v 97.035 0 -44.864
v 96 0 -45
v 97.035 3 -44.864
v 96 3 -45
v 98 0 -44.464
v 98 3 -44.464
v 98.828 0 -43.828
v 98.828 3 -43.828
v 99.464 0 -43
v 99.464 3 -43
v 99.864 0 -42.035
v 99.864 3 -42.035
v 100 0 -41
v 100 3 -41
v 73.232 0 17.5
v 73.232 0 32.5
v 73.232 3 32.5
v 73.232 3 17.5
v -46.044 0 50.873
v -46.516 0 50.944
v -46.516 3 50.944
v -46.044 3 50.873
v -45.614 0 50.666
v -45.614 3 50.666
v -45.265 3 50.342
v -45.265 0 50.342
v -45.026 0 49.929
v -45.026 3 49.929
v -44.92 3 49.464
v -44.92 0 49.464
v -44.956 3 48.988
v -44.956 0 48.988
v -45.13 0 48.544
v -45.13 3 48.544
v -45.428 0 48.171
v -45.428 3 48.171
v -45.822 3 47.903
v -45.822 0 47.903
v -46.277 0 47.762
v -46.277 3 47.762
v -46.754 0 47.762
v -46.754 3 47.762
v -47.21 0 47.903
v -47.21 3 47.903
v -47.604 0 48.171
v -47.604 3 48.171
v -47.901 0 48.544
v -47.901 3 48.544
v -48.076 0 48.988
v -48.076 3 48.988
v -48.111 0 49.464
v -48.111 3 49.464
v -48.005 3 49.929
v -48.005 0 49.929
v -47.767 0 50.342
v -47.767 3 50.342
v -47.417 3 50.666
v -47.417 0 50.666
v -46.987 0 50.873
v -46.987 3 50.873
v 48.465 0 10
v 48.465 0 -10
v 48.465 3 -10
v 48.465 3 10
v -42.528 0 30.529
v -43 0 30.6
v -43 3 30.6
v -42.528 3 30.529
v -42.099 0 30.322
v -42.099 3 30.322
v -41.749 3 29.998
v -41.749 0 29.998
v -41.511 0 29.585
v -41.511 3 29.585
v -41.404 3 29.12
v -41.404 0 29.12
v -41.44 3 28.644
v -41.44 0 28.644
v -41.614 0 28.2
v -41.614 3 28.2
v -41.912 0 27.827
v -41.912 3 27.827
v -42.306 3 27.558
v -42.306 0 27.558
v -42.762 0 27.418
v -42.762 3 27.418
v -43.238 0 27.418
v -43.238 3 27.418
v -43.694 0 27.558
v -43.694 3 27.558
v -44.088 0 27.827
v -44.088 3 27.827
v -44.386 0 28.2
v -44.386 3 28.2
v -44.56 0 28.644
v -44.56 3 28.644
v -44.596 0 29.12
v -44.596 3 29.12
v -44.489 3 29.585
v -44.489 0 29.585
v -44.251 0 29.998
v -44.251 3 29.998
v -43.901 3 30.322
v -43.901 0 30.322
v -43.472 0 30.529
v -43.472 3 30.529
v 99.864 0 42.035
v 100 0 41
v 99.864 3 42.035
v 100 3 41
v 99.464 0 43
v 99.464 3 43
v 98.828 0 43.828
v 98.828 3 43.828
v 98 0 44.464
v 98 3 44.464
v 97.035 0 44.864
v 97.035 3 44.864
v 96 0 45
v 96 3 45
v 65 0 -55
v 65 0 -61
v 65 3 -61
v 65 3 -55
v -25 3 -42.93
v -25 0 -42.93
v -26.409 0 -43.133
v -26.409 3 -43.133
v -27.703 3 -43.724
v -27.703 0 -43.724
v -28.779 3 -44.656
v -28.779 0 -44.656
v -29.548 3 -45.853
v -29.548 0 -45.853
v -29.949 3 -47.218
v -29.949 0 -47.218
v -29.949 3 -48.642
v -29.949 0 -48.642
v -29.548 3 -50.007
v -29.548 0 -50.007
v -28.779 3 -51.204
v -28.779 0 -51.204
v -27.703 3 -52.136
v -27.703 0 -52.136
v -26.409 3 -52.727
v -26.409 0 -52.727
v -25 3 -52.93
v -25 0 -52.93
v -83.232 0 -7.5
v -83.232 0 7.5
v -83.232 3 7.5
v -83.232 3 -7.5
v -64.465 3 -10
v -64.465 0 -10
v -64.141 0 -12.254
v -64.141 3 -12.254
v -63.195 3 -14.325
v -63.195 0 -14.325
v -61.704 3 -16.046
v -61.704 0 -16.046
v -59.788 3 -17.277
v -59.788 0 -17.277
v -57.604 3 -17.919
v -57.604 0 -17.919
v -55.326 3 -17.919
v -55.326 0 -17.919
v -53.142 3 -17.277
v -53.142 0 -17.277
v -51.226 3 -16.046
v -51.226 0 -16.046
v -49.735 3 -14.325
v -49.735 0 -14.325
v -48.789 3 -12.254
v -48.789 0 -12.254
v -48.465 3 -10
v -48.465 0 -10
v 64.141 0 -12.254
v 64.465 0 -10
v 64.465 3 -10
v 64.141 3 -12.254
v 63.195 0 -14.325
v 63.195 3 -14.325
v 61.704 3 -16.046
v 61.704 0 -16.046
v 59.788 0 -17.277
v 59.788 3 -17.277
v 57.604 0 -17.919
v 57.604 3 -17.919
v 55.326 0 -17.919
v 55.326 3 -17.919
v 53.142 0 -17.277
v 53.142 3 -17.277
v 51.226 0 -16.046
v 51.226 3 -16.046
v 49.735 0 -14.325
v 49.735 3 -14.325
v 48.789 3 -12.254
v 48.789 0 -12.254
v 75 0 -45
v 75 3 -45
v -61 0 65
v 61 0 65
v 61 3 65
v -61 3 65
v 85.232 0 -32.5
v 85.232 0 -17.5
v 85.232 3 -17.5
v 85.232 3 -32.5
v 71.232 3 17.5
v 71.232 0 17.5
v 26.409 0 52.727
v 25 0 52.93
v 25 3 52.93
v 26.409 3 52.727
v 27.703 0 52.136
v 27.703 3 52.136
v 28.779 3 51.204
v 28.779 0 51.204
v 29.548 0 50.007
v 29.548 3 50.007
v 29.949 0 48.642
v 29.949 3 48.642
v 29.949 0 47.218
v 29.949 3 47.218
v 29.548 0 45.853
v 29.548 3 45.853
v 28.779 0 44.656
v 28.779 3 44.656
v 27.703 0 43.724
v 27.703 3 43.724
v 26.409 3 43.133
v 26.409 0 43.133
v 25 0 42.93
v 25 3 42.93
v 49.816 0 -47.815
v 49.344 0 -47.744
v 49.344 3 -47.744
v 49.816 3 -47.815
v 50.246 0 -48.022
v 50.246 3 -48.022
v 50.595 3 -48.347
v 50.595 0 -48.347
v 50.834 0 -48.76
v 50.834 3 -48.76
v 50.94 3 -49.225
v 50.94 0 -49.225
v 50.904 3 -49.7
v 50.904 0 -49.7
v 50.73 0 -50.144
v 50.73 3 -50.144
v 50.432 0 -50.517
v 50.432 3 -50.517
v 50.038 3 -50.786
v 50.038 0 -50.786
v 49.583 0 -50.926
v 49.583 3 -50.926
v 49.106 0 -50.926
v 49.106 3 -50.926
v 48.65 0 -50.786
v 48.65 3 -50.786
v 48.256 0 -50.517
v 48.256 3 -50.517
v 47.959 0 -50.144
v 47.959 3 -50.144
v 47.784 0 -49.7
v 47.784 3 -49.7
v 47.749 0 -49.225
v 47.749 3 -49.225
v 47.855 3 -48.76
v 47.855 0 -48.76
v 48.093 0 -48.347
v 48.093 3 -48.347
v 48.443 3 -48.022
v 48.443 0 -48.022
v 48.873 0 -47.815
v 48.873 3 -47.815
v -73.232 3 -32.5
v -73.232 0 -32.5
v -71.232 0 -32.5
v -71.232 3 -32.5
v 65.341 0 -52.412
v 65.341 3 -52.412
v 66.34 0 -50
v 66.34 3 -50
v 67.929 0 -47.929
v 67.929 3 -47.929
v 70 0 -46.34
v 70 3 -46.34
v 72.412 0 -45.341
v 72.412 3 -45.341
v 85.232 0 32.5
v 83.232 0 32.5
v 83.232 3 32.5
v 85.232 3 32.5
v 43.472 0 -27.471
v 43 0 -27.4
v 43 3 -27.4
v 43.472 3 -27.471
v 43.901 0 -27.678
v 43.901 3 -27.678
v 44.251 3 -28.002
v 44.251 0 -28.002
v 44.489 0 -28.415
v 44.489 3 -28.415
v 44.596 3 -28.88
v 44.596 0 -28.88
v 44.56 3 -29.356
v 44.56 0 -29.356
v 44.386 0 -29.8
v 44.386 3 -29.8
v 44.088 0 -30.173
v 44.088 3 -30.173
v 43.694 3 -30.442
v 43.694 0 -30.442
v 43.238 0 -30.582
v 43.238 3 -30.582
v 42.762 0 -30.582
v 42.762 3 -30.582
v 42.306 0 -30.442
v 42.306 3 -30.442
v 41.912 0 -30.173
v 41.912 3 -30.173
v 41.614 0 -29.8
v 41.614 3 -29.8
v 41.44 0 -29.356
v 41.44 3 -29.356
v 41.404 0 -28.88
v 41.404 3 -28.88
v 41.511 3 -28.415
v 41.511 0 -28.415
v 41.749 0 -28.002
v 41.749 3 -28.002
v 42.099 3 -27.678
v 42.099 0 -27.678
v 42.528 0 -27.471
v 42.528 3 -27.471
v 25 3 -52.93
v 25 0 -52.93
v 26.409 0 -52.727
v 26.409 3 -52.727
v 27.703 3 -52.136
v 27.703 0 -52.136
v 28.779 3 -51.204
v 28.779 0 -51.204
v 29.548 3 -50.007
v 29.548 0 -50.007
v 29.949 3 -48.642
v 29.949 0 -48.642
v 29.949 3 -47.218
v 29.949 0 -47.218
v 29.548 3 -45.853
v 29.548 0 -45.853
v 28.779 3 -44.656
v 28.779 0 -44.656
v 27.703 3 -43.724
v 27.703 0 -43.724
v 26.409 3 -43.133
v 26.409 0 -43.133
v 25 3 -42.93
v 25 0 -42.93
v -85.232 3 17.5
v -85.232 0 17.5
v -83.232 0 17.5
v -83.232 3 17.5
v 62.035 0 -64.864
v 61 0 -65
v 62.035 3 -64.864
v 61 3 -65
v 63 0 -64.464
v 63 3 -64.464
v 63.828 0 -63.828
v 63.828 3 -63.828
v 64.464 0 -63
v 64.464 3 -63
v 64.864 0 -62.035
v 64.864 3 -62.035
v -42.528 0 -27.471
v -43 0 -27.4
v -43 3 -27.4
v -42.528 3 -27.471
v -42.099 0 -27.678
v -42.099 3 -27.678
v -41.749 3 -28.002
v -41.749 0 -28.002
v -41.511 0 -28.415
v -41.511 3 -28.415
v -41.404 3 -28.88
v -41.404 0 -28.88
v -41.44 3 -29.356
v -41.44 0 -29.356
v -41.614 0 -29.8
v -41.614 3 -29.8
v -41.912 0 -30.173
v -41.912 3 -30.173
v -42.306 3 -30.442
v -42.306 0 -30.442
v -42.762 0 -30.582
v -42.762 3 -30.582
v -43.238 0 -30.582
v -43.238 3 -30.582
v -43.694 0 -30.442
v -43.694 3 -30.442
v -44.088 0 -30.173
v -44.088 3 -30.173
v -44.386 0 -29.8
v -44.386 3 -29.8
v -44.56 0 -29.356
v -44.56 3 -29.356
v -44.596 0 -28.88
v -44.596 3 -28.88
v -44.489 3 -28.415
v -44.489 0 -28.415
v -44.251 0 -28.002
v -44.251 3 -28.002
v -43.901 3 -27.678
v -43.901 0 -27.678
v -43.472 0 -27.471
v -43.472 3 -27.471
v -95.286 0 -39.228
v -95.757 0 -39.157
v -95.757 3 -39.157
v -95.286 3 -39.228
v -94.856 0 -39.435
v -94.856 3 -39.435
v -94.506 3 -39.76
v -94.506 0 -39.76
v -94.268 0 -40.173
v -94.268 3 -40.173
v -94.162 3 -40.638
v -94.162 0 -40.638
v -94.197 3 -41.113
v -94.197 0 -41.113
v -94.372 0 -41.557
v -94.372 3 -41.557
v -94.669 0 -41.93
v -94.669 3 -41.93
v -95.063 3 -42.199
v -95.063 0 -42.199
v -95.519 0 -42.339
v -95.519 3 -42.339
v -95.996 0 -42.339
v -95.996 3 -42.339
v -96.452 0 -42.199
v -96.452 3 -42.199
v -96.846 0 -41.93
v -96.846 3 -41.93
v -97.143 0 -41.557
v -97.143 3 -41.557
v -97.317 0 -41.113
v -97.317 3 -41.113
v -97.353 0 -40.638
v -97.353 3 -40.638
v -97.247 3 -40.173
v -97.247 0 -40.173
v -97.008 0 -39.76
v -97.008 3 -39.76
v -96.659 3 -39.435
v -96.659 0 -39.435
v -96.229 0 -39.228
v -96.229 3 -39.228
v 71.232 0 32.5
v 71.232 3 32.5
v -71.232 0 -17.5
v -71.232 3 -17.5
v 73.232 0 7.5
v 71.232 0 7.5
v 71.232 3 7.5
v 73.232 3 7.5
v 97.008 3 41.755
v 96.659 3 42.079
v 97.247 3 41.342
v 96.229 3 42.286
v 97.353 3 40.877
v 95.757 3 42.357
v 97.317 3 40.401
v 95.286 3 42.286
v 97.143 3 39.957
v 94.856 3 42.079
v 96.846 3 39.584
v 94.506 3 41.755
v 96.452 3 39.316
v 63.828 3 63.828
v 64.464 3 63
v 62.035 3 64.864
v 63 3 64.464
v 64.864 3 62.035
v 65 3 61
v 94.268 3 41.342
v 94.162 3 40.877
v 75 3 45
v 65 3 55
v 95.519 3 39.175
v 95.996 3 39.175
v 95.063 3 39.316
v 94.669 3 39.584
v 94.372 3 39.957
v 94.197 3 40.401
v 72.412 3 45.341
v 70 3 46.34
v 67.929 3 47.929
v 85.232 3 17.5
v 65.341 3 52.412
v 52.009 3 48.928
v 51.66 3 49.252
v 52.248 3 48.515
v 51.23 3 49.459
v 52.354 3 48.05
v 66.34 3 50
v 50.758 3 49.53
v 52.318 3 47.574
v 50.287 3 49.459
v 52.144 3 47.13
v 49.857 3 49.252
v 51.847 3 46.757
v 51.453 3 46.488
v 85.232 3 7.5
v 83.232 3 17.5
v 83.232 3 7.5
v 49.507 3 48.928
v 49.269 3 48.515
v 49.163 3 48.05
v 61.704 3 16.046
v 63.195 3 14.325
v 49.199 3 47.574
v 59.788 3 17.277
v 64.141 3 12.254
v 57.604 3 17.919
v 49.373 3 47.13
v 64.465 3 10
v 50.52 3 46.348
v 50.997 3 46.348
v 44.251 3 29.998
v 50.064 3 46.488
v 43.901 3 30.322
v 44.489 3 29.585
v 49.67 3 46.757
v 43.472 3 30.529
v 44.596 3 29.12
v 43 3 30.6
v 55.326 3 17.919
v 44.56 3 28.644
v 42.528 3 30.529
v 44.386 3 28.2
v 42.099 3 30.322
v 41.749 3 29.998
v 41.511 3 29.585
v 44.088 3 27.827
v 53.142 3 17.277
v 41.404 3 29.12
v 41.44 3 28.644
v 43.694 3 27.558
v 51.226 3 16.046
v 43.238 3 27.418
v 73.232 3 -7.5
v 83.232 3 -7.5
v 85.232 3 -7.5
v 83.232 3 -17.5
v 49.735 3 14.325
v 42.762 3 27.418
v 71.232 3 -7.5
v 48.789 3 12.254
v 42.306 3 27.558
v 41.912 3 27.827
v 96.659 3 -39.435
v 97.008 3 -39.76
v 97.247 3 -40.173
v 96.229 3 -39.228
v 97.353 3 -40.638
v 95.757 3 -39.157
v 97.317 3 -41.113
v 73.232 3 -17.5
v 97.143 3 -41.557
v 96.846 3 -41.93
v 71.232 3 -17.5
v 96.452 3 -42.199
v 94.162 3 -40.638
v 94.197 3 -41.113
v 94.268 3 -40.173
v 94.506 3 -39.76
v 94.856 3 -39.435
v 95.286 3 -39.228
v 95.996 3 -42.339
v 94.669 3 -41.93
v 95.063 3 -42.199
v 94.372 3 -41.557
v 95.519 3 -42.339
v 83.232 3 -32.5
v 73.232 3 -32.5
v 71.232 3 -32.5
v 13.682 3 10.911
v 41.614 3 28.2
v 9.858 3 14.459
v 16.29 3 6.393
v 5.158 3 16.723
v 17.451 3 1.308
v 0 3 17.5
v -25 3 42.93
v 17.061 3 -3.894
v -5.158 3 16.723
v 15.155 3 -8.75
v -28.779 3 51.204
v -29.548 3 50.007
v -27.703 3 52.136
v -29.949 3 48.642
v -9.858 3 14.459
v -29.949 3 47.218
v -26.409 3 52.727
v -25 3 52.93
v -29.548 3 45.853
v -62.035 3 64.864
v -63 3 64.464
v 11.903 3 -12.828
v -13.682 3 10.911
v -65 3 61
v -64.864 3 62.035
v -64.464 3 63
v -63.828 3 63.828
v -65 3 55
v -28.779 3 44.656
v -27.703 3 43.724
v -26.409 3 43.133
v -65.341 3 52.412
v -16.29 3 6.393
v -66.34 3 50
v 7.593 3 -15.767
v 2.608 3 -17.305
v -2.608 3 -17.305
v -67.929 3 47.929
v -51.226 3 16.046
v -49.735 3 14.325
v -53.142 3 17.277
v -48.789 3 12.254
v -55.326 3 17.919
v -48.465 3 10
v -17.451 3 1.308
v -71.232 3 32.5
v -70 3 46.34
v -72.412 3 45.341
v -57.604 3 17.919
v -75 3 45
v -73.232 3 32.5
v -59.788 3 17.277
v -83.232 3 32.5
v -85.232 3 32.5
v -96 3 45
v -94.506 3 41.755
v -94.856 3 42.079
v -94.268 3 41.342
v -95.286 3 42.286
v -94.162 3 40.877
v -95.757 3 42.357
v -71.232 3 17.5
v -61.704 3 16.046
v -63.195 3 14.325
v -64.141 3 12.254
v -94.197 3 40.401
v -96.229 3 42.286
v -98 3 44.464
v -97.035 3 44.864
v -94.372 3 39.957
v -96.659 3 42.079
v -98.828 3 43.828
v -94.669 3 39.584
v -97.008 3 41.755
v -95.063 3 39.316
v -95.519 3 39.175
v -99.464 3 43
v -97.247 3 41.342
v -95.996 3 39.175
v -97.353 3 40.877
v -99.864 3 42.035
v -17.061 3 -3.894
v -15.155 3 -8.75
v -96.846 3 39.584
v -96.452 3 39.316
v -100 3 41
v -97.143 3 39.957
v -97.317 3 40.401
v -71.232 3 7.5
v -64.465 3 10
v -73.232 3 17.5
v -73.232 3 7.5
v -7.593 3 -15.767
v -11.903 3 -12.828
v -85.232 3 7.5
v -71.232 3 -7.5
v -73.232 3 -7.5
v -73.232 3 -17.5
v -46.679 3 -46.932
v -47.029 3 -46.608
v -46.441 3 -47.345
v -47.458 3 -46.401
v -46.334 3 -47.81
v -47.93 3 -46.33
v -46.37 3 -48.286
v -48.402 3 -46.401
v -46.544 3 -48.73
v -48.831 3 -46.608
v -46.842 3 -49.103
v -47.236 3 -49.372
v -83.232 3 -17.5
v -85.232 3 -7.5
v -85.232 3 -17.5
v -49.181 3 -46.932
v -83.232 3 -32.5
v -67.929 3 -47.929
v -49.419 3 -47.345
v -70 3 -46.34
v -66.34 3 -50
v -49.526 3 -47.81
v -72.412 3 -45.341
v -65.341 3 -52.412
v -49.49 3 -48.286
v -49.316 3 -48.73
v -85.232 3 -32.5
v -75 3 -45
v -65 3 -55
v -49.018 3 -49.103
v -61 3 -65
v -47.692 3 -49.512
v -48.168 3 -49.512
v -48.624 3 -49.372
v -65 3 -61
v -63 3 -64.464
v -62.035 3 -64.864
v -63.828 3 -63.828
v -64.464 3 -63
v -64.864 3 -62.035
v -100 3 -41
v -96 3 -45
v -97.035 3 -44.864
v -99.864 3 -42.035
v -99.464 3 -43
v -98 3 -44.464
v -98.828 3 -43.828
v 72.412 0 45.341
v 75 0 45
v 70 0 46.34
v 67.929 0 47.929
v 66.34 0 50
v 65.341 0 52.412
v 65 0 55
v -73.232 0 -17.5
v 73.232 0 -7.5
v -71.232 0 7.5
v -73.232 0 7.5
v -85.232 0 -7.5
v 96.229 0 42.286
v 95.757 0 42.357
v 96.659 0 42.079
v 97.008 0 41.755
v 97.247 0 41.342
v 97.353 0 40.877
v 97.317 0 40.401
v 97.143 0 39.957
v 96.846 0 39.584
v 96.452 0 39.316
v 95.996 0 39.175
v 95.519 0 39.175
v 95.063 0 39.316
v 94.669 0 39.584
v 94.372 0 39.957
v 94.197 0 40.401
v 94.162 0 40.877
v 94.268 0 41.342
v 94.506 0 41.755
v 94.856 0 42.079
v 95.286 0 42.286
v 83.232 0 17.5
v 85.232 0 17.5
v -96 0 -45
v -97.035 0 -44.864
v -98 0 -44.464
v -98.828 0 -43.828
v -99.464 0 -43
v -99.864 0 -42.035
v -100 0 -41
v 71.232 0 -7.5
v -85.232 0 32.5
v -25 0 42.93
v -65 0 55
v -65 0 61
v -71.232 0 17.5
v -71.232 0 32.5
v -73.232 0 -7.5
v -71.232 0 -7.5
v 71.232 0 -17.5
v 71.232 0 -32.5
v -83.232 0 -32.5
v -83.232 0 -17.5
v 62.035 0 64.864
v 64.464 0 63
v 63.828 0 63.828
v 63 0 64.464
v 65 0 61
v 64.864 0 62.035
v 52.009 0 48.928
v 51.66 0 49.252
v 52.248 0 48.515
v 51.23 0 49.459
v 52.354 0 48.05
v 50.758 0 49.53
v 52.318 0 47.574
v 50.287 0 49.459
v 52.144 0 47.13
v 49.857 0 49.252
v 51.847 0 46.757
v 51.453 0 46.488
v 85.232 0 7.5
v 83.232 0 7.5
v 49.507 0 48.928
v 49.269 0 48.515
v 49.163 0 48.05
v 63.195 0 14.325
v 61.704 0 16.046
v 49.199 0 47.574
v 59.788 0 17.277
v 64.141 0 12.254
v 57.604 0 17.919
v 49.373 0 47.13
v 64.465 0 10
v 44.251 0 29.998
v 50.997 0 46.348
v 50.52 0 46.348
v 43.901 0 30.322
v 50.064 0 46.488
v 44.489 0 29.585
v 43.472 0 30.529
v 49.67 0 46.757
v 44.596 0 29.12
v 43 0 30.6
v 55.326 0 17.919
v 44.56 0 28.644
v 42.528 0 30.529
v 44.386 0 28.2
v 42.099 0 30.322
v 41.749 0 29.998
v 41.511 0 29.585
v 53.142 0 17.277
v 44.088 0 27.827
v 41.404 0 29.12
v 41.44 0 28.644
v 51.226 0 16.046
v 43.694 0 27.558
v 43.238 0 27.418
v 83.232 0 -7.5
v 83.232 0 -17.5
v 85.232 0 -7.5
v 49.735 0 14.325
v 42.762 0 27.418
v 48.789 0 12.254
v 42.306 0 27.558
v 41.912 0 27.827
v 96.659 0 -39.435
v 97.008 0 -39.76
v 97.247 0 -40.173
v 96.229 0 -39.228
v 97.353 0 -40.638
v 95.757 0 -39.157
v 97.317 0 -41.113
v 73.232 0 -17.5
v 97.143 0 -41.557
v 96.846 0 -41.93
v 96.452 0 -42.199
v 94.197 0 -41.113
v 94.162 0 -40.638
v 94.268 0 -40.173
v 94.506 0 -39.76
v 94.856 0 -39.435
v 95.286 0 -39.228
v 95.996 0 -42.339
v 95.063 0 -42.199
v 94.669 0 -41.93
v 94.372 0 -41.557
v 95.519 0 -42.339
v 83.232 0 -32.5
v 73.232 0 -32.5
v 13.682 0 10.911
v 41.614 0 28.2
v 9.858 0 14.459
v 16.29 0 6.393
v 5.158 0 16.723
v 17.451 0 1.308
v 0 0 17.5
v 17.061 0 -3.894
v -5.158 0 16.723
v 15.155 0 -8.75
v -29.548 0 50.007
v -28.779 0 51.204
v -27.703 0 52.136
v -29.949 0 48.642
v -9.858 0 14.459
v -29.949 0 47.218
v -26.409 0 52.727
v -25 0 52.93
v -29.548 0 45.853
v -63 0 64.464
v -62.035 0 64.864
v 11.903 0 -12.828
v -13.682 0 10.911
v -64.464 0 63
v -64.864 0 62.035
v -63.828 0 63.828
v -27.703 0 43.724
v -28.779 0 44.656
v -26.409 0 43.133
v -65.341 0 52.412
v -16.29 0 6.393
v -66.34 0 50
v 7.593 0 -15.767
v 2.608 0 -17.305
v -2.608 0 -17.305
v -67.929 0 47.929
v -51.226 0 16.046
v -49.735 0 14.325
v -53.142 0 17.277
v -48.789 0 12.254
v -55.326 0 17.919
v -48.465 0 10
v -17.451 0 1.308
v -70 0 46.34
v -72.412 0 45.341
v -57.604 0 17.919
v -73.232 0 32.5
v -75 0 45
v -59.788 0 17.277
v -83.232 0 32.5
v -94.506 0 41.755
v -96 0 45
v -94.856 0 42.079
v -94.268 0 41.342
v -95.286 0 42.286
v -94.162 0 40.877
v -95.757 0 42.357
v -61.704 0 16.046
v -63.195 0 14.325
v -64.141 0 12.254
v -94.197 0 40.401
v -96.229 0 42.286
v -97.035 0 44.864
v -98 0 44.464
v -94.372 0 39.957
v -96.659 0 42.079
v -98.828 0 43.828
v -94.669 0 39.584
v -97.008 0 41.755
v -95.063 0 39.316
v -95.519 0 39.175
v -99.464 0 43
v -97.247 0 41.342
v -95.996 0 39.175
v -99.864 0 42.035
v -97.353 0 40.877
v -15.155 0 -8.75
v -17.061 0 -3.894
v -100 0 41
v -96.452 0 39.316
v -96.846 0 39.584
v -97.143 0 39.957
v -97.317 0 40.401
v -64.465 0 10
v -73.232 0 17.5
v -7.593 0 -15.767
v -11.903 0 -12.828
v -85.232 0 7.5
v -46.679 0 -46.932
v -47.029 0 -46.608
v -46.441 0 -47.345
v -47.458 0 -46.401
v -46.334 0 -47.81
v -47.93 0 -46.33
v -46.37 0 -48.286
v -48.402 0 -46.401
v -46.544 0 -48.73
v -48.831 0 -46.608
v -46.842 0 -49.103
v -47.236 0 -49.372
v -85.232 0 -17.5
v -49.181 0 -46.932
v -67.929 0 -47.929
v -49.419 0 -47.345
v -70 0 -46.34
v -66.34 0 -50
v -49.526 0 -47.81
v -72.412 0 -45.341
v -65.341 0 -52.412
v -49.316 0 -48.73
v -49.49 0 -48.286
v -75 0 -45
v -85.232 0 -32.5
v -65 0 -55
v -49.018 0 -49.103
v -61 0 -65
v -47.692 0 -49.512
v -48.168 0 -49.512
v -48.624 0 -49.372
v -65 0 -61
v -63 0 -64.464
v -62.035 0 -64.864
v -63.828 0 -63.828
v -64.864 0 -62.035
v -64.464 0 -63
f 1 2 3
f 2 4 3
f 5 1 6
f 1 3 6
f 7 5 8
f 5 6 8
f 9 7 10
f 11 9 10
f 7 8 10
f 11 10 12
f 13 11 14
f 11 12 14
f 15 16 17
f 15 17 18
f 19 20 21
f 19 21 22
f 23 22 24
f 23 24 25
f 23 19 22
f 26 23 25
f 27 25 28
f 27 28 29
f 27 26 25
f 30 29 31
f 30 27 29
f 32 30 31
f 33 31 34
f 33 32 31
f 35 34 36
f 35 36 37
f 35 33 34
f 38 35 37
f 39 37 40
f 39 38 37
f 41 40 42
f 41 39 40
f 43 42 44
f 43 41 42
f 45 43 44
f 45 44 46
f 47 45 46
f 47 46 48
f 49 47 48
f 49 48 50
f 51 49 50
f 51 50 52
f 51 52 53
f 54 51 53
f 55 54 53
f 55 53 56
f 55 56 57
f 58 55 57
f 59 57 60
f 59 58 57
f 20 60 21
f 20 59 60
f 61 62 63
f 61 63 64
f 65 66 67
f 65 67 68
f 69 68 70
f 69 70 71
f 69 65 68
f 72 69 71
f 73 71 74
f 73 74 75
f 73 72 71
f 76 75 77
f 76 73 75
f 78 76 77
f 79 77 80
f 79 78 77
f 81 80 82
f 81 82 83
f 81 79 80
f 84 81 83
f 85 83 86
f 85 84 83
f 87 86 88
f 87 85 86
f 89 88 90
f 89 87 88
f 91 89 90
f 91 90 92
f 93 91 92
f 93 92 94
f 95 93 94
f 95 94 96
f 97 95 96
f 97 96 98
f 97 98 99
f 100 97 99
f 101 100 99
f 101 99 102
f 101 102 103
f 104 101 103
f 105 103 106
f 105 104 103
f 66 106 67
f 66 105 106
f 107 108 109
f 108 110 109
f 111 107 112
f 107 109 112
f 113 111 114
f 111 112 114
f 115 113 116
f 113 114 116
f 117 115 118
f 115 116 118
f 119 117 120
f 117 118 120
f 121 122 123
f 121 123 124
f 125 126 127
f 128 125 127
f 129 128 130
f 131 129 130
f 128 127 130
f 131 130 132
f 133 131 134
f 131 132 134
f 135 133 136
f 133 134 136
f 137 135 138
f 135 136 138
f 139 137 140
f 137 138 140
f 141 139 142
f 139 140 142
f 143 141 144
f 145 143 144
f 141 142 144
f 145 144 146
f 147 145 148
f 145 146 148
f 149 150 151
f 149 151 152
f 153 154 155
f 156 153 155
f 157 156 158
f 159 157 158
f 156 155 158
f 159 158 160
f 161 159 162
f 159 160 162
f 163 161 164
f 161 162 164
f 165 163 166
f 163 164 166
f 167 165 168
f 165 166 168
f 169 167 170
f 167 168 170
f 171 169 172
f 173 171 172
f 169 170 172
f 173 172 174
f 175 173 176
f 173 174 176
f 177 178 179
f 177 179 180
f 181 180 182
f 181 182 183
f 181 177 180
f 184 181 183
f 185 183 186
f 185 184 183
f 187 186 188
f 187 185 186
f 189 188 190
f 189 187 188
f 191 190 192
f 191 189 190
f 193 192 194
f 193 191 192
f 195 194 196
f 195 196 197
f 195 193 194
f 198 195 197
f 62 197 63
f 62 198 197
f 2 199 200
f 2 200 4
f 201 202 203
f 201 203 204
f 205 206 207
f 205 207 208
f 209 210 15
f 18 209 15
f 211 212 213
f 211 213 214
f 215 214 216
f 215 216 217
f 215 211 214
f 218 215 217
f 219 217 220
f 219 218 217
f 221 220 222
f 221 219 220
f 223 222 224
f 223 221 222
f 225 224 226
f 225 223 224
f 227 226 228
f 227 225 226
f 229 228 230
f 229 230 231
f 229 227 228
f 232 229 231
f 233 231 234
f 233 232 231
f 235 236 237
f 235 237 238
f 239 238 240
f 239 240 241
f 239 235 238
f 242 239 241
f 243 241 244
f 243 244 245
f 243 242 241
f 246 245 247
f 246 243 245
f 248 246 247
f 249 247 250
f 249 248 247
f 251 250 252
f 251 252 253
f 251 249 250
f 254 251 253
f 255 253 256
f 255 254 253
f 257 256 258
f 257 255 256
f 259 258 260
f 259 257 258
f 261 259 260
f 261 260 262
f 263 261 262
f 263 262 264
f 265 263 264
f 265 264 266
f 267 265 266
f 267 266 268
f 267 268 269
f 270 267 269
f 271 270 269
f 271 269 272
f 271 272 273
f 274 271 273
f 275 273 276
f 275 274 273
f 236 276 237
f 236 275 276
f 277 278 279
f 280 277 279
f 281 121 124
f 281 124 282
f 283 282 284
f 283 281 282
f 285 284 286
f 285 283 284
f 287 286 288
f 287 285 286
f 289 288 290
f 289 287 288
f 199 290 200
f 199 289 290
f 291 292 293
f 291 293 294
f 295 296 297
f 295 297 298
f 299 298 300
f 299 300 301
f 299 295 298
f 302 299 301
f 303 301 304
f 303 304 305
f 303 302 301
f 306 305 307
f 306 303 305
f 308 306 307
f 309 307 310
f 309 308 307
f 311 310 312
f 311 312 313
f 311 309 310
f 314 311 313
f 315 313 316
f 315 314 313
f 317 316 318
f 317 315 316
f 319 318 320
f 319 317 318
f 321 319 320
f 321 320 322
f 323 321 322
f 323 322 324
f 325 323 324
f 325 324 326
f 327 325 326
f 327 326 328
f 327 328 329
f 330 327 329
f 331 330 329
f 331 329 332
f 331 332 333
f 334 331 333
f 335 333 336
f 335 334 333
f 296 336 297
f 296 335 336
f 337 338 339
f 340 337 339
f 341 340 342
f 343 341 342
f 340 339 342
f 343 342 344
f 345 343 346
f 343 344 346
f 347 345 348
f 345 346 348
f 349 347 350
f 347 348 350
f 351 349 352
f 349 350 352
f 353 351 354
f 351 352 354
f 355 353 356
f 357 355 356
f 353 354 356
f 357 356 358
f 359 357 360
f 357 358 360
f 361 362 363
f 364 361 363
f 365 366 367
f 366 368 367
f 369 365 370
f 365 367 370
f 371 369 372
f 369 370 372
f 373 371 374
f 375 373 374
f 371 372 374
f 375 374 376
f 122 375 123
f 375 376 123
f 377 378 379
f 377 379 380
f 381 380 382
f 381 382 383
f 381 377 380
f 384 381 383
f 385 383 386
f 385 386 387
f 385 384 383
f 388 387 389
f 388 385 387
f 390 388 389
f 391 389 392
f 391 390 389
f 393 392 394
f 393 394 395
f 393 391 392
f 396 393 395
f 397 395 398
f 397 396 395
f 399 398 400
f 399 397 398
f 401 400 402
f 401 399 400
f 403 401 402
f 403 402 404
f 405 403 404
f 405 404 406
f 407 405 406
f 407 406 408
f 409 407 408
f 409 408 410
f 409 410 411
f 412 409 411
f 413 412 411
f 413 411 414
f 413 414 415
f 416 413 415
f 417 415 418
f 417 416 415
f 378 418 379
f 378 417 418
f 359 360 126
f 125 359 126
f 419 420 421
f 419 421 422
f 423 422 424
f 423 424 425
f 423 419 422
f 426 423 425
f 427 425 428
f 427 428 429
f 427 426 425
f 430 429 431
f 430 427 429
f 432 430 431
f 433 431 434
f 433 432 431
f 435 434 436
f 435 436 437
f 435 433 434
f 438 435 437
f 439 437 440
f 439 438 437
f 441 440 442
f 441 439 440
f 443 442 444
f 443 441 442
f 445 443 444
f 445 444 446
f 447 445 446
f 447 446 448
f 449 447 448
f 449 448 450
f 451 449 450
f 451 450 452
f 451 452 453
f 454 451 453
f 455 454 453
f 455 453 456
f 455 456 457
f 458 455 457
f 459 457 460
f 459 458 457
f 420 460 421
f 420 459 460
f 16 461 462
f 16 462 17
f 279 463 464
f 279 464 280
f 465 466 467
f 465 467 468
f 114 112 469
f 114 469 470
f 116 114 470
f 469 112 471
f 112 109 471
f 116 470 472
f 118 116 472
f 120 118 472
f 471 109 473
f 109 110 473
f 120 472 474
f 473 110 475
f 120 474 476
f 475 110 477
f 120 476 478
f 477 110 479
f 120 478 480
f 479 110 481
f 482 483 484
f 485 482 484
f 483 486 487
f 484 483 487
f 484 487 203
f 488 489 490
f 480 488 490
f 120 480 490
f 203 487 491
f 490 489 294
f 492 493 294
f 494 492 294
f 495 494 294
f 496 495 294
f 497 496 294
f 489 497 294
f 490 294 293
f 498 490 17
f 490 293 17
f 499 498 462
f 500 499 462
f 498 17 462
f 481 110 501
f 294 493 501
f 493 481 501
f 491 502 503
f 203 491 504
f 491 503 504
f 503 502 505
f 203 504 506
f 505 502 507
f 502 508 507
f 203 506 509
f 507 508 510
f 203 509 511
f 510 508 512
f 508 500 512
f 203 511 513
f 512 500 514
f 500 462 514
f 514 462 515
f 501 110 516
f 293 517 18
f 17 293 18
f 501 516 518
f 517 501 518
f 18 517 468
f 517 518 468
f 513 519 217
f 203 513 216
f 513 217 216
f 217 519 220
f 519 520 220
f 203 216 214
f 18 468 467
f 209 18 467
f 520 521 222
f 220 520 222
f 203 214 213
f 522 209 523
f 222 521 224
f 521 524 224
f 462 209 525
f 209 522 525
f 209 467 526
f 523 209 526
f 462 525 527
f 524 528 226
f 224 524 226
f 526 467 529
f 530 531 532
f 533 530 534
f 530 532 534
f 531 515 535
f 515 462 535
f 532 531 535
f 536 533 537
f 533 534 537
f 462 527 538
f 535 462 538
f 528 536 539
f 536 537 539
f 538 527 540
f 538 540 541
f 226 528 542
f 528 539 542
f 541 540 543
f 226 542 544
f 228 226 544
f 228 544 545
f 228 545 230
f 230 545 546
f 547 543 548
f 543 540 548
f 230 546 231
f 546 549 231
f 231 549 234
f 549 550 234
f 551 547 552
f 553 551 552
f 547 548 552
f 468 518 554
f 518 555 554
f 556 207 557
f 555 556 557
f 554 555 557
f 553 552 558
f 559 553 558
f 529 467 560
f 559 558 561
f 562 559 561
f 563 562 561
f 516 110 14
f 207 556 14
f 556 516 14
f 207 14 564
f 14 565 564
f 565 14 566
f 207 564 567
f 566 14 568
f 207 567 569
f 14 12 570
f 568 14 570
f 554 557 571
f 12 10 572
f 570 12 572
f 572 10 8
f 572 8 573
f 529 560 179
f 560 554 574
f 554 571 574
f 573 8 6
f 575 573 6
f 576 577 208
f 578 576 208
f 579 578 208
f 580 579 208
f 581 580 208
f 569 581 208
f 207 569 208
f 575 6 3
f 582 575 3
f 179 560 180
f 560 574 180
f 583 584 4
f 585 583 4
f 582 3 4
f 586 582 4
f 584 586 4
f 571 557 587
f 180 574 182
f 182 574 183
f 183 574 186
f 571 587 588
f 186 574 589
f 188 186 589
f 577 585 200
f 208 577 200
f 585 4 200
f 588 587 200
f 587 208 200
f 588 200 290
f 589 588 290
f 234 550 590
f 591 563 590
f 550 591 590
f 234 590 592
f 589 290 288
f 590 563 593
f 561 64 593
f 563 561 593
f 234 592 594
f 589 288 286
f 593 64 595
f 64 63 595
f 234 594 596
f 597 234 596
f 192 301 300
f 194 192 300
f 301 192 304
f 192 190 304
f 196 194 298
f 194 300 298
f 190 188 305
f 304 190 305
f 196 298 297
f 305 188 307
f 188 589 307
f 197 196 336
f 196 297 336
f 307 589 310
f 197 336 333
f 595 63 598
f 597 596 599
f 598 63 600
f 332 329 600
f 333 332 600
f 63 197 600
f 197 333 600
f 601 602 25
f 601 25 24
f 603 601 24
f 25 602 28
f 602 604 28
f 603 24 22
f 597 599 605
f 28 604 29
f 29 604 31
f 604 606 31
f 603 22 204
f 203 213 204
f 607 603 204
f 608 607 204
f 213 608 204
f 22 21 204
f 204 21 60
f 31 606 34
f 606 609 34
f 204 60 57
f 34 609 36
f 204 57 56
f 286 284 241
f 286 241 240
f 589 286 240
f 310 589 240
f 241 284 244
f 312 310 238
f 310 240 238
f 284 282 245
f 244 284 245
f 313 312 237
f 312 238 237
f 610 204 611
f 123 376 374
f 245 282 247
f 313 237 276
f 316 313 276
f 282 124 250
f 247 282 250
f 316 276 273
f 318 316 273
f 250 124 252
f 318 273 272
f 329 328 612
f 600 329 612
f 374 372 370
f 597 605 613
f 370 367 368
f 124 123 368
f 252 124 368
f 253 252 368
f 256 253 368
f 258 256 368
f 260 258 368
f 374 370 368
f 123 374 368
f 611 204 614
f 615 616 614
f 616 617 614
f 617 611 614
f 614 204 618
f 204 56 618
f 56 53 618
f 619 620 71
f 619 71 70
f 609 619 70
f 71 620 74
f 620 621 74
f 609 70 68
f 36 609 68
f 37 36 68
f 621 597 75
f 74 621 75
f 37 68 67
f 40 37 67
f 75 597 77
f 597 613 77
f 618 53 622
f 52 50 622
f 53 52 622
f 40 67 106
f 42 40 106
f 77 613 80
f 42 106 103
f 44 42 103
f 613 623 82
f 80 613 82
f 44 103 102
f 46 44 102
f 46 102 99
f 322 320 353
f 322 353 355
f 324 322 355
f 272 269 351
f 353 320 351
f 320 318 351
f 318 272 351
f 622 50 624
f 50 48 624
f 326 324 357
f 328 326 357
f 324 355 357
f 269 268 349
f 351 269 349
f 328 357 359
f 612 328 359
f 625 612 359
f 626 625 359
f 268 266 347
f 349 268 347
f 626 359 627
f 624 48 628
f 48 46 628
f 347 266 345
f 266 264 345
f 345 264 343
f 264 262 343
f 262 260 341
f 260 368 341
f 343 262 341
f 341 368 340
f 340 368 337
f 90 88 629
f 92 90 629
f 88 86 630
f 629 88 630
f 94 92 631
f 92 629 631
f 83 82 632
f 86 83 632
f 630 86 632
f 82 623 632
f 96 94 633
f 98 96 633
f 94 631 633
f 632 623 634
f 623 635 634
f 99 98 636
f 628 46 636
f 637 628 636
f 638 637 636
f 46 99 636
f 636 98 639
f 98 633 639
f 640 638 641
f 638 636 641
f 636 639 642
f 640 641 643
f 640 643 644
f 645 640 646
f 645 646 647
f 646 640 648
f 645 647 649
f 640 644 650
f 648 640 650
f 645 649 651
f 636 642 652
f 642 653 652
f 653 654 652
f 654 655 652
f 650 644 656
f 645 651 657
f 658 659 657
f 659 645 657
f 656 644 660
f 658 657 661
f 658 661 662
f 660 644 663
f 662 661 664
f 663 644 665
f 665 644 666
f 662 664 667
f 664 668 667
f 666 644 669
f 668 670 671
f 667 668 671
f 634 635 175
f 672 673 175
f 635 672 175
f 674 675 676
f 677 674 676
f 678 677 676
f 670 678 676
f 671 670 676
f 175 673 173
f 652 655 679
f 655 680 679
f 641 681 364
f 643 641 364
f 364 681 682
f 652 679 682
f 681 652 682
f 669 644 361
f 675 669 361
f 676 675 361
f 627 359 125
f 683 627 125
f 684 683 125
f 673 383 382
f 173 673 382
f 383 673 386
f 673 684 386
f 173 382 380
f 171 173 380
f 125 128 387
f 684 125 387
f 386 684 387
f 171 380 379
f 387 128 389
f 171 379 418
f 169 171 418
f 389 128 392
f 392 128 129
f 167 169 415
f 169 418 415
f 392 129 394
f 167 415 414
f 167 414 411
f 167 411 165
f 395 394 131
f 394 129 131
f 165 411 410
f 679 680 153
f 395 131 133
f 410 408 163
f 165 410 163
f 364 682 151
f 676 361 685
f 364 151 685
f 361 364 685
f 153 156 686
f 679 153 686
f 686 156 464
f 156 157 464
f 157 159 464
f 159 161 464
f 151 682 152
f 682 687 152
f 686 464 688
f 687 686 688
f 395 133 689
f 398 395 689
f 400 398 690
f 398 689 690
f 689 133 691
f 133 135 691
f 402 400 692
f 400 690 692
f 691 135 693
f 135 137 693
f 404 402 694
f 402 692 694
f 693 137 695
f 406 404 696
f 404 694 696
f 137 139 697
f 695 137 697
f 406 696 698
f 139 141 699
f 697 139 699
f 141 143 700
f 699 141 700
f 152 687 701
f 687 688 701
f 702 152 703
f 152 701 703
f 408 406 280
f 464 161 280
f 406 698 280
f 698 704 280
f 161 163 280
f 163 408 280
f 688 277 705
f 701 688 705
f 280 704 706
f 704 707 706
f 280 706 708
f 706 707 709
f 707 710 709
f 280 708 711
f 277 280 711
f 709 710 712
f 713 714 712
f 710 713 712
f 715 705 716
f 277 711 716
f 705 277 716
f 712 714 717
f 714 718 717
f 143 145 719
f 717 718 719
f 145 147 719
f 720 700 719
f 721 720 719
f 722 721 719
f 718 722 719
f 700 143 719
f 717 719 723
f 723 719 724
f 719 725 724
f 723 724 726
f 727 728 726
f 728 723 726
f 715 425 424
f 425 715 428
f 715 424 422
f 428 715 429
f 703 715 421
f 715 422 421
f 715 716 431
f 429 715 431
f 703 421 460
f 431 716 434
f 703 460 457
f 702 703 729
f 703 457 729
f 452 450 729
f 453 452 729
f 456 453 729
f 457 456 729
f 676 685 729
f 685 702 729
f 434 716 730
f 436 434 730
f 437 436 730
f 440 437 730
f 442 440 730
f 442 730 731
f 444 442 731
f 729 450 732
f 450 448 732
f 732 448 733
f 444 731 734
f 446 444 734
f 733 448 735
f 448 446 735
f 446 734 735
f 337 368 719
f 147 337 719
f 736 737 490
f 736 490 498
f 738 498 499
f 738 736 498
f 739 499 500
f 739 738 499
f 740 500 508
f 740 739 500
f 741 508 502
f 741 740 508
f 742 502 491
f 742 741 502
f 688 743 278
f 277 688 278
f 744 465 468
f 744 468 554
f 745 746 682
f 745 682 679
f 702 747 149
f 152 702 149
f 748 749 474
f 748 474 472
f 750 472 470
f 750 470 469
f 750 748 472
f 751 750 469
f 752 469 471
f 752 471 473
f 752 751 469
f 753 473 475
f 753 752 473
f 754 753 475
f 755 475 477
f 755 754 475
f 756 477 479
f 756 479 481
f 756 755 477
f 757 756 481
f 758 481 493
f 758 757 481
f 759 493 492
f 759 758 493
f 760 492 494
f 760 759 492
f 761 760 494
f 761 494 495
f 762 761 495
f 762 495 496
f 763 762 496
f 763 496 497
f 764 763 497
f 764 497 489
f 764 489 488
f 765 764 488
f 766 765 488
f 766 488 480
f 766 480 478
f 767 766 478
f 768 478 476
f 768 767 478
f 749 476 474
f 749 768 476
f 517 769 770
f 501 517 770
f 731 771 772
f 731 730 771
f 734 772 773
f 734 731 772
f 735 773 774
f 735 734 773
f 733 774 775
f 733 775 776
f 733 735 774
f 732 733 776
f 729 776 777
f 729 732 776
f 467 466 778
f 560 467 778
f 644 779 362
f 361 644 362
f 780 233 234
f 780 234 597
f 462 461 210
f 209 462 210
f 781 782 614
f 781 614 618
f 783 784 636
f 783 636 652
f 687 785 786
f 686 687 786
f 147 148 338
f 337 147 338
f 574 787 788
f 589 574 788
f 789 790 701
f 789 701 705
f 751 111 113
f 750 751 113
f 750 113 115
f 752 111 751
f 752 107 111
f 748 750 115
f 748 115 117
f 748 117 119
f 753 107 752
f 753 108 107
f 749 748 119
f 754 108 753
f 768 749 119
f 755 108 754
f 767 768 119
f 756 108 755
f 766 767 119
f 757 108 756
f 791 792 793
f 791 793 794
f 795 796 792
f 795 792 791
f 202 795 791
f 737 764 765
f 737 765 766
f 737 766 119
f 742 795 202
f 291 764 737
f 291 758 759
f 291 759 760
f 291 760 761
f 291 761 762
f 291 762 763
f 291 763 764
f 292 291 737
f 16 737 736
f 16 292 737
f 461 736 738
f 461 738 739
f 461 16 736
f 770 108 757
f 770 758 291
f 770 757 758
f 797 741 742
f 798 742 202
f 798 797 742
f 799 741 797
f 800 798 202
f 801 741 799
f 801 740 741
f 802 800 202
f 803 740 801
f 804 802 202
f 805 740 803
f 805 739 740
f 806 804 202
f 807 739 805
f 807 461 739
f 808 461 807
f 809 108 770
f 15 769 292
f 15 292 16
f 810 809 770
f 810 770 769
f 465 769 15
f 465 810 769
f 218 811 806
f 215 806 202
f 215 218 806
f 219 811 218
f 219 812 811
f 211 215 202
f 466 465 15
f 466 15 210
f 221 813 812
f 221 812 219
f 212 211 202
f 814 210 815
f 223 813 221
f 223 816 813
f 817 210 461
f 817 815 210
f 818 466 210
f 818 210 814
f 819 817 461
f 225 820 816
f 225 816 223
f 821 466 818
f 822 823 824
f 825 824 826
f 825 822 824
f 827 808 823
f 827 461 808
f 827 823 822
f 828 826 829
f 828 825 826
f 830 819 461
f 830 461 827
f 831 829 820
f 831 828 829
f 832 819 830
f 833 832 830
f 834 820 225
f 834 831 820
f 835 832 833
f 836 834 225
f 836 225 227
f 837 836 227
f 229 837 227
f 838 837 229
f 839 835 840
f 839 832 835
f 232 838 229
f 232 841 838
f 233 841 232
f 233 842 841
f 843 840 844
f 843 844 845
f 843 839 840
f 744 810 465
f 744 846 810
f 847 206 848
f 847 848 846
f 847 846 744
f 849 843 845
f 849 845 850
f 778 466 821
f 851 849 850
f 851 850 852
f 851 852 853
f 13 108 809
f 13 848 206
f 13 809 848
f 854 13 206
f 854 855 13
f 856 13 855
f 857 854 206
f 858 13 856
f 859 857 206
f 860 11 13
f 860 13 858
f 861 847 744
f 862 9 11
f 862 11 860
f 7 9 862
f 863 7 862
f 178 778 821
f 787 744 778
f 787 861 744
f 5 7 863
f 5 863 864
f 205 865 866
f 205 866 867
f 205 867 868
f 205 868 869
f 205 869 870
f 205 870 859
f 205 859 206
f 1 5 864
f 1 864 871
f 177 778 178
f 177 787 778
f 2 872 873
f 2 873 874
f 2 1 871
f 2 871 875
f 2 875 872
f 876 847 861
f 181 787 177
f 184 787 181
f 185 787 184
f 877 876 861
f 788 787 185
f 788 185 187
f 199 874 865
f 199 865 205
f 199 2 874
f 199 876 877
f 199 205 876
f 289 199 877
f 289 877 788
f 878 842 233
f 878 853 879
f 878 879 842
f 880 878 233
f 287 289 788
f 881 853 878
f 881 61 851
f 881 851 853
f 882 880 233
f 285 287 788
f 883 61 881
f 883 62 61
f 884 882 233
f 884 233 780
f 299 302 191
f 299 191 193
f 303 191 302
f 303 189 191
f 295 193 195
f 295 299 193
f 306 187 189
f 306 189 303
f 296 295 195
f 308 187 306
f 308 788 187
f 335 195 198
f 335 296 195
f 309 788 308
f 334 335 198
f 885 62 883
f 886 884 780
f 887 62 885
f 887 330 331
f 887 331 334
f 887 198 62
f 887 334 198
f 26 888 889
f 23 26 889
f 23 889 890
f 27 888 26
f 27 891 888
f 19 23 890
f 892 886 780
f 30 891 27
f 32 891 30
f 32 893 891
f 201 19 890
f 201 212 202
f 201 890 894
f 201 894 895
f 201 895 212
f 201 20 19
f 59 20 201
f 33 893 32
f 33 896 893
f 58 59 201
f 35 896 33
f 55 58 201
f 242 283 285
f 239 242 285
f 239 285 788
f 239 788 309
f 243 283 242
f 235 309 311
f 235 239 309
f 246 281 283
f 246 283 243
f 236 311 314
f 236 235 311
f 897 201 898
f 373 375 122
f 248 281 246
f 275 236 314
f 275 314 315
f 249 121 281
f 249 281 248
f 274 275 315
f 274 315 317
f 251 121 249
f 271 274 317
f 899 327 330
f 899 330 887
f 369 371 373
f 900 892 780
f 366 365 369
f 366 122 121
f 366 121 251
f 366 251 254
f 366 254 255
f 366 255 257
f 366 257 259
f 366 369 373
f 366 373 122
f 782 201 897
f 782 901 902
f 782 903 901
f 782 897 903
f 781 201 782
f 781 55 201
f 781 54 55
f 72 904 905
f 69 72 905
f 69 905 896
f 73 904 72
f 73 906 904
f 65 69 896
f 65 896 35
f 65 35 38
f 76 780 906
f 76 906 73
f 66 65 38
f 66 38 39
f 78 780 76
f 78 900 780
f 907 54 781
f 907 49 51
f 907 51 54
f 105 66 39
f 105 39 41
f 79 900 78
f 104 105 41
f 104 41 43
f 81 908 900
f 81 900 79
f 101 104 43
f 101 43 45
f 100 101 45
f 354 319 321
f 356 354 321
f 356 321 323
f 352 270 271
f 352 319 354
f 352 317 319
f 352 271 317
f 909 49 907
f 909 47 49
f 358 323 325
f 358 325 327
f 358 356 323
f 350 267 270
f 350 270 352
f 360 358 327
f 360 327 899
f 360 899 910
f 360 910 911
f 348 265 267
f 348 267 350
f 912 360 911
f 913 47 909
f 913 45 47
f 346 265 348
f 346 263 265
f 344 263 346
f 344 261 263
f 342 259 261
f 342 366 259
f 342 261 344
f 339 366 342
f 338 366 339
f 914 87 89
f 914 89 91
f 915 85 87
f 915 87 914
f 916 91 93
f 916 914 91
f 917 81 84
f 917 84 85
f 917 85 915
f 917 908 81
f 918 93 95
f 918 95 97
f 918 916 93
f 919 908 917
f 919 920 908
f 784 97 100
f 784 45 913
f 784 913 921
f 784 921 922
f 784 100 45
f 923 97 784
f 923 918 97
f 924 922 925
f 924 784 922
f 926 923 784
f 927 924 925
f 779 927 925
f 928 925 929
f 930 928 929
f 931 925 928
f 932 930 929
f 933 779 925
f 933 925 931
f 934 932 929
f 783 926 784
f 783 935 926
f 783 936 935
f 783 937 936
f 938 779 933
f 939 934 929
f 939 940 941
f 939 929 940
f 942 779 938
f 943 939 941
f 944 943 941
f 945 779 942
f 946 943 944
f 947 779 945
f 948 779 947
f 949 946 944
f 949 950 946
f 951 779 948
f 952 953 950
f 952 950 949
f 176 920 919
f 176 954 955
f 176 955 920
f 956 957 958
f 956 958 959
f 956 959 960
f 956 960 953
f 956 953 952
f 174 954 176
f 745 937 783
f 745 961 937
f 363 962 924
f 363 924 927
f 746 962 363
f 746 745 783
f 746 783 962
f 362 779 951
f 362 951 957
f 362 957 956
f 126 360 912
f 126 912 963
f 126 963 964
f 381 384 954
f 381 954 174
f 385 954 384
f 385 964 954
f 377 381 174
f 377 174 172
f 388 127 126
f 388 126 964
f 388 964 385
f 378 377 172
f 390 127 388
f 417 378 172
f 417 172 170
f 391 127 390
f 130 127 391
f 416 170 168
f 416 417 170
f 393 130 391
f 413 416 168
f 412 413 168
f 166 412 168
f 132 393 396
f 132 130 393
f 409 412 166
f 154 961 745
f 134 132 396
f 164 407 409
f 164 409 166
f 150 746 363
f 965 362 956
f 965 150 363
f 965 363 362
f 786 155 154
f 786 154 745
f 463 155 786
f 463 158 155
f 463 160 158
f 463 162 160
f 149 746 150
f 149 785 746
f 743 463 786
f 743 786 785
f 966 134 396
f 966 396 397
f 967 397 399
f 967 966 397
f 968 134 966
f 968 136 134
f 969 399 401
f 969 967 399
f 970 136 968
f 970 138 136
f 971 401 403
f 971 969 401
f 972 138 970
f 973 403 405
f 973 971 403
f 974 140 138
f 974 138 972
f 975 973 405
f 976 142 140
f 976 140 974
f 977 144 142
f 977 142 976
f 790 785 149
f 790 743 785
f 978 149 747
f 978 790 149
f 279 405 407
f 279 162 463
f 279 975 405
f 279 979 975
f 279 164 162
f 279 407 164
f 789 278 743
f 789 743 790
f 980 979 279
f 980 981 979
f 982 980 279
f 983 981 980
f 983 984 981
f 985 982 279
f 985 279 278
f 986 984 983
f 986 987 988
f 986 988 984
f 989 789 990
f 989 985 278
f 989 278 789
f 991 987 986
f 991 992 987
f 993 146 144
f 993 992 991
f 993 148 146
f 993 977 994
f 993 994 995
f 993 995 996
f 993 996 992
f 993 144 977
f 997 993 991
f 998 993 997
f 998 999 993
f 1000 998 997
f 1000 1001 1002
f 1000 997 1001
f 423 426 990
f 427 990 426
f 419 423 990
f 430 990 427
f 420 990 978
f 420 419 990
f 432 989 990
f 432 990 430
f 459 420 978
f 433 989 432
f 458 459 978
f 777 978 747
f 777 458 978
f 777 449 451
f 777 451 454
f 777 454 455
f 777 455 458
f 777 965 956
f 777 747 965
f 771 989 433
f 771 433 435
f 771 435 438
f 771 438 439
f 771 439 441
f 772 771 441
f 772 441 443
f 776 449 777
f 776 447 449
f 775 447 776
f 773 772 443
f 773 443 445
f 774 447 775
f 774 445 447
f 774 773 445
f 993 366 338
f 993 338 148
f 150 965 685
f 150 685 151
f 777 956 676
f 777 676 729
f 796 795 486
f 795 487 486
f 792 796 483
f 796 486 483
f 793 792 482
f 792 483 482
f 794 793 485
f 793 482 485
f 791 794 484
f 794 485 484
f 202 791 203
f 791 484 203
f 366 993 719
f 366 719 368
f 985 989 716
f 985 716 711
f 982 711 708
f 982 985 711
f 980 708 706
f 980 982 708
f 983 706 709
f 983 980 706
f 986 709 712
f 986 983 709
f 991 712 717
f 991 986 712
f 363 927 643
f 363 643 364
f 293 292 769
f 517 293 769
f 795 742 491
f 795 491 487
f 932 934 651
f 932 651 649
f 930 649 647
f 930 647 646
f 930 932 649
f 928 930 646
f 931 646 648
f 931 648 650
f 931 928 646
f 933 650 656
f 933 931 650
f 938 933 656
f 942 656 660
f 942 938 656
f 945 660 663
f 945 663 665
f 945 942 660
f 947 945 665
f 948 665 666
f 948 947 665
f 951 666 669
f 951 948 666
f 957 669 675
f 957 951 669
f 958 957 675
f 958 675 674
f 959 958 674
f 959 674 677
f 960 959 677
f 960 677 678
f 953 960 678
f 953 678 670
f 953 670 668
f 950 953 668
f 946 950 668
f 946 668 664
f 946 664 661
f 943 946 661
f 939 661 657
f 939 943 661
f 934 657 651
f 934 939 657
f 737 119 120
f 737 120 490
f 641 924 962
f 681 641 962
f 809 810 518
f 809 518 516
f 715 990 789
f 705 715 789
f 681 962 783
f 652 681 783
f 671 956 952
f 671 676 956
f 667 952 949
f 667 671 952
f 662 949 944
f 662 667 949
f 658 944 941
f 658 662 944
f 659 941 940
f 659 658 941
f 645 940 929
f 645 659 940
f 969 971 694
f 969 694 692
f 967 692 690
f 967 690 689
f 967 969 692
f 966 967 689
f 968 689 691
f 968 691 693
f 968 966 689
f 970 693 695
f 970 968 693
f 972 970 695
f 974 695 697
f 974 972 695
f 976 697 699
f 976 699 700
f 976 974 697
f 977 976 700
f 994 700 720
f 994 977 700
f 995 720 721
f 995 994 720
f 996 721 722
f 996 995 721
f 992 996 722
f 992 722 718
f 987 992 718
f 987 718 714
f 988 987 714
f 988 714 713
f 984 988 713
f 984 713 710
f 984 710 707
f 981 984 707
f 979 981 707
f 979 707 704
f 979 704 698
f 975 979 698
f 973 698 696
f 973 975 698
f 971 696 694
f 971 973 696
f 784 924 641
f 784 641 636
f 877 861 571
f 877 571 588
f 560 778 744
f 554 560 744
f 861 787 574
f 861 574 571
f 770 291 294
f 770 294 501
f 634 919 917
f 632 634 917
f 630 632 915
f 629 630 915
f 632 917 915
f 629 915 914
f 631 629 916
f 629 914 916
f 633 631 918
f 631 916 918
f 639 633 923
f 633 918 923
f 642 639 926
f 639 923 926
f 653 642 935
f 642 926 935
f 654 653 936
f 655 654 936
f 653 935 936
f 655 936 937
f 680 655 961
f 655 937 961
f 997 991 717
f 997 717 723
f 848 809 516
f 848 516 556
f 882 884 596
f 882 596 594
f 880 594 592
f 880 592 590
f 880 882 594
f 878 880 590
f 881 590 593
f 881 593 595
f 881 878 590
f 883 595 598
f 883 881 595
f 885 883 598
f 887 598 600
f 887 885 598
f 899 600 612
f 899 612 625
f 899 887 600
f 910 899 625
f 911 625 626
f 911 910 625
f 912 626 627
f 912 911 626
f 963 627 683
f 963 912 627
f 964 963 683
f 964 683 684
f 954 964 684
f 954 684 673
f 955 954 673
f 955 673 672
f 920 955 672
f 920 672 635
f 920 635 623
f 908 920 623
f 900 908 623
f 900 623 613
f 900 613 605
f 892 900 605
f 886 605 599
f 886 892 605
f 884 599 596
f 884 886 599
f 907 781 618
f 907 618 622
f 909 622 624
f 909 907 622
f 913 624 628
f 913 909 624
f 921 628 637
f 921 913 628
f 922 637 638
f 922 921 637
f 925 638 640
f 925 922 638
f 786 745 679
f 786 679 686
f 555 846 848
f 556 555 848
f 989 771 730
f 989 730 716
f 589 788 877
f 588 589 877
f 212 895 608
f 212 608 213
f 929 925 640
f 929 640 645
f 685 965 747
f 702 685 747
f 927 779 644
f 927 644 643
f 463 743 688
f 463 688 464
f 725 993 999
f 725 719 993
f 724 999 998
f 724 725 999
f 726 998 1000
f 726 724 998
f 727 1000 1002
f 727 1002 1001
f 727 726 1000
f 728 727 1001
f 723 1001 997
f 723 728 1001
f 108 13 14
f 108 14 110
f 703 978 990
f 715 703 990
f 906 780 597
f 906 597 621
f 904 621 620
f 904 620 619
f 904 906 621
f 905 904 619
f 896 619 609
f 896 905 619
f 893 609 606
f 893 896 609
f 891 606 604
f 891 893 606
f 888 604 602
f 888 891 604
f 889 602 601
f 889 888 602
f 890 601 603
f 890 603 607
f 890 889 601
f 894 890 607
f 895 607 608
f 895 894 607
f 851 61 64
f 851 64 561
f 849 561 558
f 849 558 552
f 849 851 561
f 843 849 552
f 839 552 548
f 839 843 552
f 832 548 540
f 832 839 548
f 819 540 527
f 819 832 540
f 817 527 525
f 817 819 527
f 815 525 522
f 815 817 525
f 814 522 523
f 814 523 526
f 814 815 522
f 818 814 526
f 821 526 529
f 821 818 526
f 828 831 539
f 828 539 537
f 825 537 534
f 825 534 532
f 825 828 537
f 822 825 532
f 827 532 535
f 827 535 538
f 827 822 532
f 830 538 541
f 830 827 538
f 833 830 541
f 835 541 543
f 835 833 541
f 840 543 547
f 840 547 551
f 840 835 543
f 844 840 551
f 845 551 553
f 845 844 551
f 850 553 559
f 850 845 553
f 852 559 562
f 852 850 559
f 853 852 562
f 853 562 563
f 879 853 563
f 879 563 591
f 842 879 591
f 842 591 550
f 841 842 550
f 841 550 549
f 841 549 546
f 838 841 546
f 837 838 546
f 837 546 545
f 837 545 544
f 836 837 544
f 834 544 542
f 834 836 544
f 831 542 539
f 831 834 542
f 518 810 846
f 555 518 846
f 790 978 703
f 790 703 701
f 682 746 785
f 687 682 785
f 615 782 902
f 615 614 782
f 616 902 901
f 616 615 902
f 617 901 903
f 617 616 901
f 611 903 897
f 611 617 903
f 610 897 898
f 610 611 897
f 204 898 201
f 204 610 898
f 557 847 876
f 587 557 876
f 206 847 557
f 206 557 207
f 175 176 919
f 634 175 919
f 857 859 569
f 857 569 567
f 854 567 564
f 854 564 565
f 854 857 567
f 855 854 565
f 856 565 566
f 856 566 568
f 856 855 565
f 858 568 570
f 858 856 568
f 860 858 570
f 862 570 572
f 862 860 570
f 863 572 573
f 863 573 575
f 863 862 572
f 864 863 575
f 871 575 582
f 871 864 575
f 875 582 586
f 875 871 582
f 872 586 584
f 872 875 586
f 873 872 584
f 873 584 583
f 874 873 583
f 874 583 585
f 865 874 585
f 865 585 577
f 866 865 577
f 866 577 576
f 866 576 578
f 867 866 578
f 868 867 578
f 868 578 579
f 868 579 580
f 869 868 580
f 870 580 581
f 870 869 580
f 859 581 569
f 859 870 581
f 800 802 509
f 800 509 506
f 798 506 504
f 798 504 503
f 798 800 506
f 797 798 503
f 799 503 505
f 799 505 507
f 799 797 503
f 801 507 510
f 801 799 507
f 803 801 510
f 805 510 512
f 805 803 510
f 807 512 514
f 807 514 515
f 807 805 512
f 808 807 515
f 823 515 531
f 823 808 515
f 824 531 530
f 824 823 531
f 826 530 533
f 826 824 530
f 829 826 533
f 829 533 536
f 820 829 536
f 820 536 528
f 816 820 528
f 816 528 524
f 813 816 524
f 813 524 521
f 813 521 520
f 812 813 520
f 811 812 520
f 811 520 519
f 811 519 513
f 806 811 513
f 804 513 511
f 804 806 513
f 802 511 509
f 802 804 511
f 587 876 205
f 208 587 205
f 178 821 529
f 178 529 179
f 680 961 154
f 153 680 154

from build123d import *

# Parameters (mm, degrees)
SKETCH_1_R      = 1.6
SKETCH_1_R_2    = 17.5
SKETCH_1_W      = 2
SKETCH_1_H      = 15
EXTRUDE_1_DEPTH = 3
FILLET_2_R      = 4


with BuildPart() as part:
    # 草图1 → 凸台-拉伸1 (new body)
    with BuildSketch(Plane(origin=(0, 0, 0), x_dir=(1, 0, 0), z_dir=(0, 1, 0))):
        with BuildLine():
            Line((-65, 65), (65, 65))
            Line((65, 65), (65, 55))
            ThreePointArc((65, 55), (67.928932188, 47.928932188), (75, 45))
            Line((75, 45), (100, 45))
            Line((100, 45), (100, -45))
            Line((100, -45), (75, -45))
            ThreePointArc((75, -45), (67.928932188, -47.928932188), (65, -55))
            Line((65, -55), (65, -65))
            Line((65, -65), (-65, -65))
            Line((-65, -65), (-65, -55))
            ThreePointArc((-65, -55), (-67.928932188, -47.928932188), (-75, -45))
            Line((-75, -45), (-100, -45))
            Line((-100, -45), (-100, 45))
            Line((-100, 45), (-75, 45))
            ThreePointArc((-75, 45), (-67.928932188, 47.928932188), (-65, 55))
            Line((-65, 55), (-65, 65))
        make_face()
        with Locations(Location((-47.93, 47.93, 0), (0, 0, 270))):
            Circle(SKETCH_1_R, mode=Mode.SUBTRACT)
        with Locations(Location((49.344213562, 49.344213562, 0), (0, 0, 270))):
            Circle(SKETCH_1_R, mode=Mode.SUBTRACT)
        with Locations(Location((50.758427125, -47.93, 0), (0, 0, 270))):
            Circle(SKETCH_1_R, mode=Mode.SUBTRACT)
        with Locations(Location((-46.515786438, -49.344213562, 0), (0, 0, 270))):
            Circle(SKETCH_1_R, mode=Mode.SUBTRACT)
        with Locations(Location((43, -29, 0), (0, 0, 270))):
            Circle(SKETCH_1_R, mode=Mode.SUBTRACT)
        with Locations(Location((-43, -29, 0), (0, 0, 270))):
            Circle(SKETCH_1_R, mode=Mode.SUBTRACT)
        with Locations(Location((-43, 29, 0), (0, 0, 270))):
            Circle(SKETCH_1_R, mode=Mode.SUBTRACT)
        with Locations(Location((43, 29, 0), (0, 0, 270))):
            Circle(SKETCH_1_R, mode=Mode.SUBTRACT)
        with Locations(Location((0, 0, 0), (0, 0, 270))):
            Circle(SKETCH_1_R_2, mode=Mode.SUBTRACT)
        with Locations(Location((-95.757359313, 40.757359313, 0), (0, 0, 270))):
            Circle(SKETCH_1_R, mode=Mode.SUBTRACT)
        with Locations(Location((95.757359313, 40.757359313, 0), (0, 0, 270))):
            Circle(SKETCH_1_R, mode=Mode.SUBTRACT)
        with Locations(Location((95.757359313, -40.757359313, 0), (0, 0, 270))):
            Circle(SKETCH_1_R, mode=Mode.SUBTRACT)
        with Locations(Location((-95.757359313, -40.757359313, 0), (0, 0, 270))):
            Circle(SKETCH_1_R, mode=Mode.SUBTRACT)
        with Locations((-84.2325, 0)):
            Rectangle(SKETCH_1_W, SKETCH_1_H, mode=Mode.SUBTRACT)
        with BuildLine():
            Line((-48.465, 10), (-48.465, -10))
            ThreePointArc((-48.465, -10), (-56.465, -18), (-64.465, -10))
            Line((-64.465, -10), (-64.465, 10))
            ThreePointArc((-64.465, 10), (-56.465, 18), (-48.465, 10))
        make_face(mode=Mode.SUBTRACT)
        with BuildLine():
            Line((48.465, 10), (48.465, -10))
            ThreePointArc((48.465, -10), (56.465, -18), (64.465, -10))
            Line((64.465, -10), (64.465, 10))
            ThreePointArc((64.465, 10), (56.465, 18), (48.465, 10))
        make_face(mode=Mode.SUBTRACT)
        with BuildLine():
            Line((-25, 52.93), (25, 52.93))
            ThreePointArc((25, 52.93), (30, 47.93), (25, 42.93))
            Line((25, 42.93), (-25, 42.93))
            ThreePointArc((-25, 42.93), (-30, 47.93), (-25, 52.93))
        make_face(mode=Mode.SUBTRACT)
        with BuildLine():
            Line((-25, -52.93), (25, -52.93))
            ThreePointArc((25, -52.93), (30, -47.93), (25, -42.93))
            Line((25, -42.93), (-25, -42.93))
            ThreePointArc((-25, -42.93), (-30, -47.93), (-25, -52.93))
        make_face(mode=Mode.SUBTRACT)
        with Locations((-72.2325, 0)):
            Rectangle(SKETCH_1_W, SKETCH_1_H, mode=Mode.SUBTRACT)
        with Locations((-84.2325, -25)):
            Rectangle(SKETCH_1_W, SKETCH_1_H, mode=Mode.SUBTRACT)
        with Locations((-72.2325, -25)):
            Rectangle(SKETCH_1_W, SKETCH_1_H, mode=Mode.SUBTRACT)
        with Locations((-72.2325, 25)):
            Rectangle(SKETCH_1_W, SKETCH_1_H, mode=Mode.SUBTRACT)
        with Locations((-84.2325, 25)):
            Rectangle(SKETCH_1_W, SKETCH_1_H, mode=Mode.SUBTRACT)
        with Locations((84.2325, 25)):
            Rectangle(SKETCH_1_W, SKETCH_1_H, mode=Mode.SUBTRACT)
        with Locations((72.2325, 25)):
            Rectangle(SKETCH_1_W, SKETCH_1_H, mode=Mode.SUBTRACT)
        with Locations((84.2325, 0)):
            Rectangle(SKETCH_1_W, SKETCH_1_H, mode=Mode.SUBTRACT)
        with Locations((72.2325, 0)):
            Rectangle(SKETCH_1_W, SKETCH_1_H, mode=Mode.SUBTRACT)
        with Locations((84.2325, -25)):
            Rectangle(SKETCH_1_W, SKETCH_1_H, mode=Mode.SUBTRACT)
        with Locations((72.2325, -25)):
            Rectangle(SKETCH_1_W, SKETCH_1_H, mode=Mode.SUBTRACT)
    extrude(amount=EXTRUDE_1_DEPTH)

    # 圆角2
    fillet_2_edges = [part.edges().sort_by_distance(p)[0] for p in [
        (100, 1.5, -45),
        (100, 1.5, 45),
        (65, 1.5, 65),
        (-65, 1.5, 65),
        (-100, 1.5, 45),
        (-100, 1.5, -45),
        (-65, 1.5, -65),
        (65, 1.5, -65),
    ]]
    fillet(fillet_2_edges, radius=FILLET_2_R)


solid = part.part
